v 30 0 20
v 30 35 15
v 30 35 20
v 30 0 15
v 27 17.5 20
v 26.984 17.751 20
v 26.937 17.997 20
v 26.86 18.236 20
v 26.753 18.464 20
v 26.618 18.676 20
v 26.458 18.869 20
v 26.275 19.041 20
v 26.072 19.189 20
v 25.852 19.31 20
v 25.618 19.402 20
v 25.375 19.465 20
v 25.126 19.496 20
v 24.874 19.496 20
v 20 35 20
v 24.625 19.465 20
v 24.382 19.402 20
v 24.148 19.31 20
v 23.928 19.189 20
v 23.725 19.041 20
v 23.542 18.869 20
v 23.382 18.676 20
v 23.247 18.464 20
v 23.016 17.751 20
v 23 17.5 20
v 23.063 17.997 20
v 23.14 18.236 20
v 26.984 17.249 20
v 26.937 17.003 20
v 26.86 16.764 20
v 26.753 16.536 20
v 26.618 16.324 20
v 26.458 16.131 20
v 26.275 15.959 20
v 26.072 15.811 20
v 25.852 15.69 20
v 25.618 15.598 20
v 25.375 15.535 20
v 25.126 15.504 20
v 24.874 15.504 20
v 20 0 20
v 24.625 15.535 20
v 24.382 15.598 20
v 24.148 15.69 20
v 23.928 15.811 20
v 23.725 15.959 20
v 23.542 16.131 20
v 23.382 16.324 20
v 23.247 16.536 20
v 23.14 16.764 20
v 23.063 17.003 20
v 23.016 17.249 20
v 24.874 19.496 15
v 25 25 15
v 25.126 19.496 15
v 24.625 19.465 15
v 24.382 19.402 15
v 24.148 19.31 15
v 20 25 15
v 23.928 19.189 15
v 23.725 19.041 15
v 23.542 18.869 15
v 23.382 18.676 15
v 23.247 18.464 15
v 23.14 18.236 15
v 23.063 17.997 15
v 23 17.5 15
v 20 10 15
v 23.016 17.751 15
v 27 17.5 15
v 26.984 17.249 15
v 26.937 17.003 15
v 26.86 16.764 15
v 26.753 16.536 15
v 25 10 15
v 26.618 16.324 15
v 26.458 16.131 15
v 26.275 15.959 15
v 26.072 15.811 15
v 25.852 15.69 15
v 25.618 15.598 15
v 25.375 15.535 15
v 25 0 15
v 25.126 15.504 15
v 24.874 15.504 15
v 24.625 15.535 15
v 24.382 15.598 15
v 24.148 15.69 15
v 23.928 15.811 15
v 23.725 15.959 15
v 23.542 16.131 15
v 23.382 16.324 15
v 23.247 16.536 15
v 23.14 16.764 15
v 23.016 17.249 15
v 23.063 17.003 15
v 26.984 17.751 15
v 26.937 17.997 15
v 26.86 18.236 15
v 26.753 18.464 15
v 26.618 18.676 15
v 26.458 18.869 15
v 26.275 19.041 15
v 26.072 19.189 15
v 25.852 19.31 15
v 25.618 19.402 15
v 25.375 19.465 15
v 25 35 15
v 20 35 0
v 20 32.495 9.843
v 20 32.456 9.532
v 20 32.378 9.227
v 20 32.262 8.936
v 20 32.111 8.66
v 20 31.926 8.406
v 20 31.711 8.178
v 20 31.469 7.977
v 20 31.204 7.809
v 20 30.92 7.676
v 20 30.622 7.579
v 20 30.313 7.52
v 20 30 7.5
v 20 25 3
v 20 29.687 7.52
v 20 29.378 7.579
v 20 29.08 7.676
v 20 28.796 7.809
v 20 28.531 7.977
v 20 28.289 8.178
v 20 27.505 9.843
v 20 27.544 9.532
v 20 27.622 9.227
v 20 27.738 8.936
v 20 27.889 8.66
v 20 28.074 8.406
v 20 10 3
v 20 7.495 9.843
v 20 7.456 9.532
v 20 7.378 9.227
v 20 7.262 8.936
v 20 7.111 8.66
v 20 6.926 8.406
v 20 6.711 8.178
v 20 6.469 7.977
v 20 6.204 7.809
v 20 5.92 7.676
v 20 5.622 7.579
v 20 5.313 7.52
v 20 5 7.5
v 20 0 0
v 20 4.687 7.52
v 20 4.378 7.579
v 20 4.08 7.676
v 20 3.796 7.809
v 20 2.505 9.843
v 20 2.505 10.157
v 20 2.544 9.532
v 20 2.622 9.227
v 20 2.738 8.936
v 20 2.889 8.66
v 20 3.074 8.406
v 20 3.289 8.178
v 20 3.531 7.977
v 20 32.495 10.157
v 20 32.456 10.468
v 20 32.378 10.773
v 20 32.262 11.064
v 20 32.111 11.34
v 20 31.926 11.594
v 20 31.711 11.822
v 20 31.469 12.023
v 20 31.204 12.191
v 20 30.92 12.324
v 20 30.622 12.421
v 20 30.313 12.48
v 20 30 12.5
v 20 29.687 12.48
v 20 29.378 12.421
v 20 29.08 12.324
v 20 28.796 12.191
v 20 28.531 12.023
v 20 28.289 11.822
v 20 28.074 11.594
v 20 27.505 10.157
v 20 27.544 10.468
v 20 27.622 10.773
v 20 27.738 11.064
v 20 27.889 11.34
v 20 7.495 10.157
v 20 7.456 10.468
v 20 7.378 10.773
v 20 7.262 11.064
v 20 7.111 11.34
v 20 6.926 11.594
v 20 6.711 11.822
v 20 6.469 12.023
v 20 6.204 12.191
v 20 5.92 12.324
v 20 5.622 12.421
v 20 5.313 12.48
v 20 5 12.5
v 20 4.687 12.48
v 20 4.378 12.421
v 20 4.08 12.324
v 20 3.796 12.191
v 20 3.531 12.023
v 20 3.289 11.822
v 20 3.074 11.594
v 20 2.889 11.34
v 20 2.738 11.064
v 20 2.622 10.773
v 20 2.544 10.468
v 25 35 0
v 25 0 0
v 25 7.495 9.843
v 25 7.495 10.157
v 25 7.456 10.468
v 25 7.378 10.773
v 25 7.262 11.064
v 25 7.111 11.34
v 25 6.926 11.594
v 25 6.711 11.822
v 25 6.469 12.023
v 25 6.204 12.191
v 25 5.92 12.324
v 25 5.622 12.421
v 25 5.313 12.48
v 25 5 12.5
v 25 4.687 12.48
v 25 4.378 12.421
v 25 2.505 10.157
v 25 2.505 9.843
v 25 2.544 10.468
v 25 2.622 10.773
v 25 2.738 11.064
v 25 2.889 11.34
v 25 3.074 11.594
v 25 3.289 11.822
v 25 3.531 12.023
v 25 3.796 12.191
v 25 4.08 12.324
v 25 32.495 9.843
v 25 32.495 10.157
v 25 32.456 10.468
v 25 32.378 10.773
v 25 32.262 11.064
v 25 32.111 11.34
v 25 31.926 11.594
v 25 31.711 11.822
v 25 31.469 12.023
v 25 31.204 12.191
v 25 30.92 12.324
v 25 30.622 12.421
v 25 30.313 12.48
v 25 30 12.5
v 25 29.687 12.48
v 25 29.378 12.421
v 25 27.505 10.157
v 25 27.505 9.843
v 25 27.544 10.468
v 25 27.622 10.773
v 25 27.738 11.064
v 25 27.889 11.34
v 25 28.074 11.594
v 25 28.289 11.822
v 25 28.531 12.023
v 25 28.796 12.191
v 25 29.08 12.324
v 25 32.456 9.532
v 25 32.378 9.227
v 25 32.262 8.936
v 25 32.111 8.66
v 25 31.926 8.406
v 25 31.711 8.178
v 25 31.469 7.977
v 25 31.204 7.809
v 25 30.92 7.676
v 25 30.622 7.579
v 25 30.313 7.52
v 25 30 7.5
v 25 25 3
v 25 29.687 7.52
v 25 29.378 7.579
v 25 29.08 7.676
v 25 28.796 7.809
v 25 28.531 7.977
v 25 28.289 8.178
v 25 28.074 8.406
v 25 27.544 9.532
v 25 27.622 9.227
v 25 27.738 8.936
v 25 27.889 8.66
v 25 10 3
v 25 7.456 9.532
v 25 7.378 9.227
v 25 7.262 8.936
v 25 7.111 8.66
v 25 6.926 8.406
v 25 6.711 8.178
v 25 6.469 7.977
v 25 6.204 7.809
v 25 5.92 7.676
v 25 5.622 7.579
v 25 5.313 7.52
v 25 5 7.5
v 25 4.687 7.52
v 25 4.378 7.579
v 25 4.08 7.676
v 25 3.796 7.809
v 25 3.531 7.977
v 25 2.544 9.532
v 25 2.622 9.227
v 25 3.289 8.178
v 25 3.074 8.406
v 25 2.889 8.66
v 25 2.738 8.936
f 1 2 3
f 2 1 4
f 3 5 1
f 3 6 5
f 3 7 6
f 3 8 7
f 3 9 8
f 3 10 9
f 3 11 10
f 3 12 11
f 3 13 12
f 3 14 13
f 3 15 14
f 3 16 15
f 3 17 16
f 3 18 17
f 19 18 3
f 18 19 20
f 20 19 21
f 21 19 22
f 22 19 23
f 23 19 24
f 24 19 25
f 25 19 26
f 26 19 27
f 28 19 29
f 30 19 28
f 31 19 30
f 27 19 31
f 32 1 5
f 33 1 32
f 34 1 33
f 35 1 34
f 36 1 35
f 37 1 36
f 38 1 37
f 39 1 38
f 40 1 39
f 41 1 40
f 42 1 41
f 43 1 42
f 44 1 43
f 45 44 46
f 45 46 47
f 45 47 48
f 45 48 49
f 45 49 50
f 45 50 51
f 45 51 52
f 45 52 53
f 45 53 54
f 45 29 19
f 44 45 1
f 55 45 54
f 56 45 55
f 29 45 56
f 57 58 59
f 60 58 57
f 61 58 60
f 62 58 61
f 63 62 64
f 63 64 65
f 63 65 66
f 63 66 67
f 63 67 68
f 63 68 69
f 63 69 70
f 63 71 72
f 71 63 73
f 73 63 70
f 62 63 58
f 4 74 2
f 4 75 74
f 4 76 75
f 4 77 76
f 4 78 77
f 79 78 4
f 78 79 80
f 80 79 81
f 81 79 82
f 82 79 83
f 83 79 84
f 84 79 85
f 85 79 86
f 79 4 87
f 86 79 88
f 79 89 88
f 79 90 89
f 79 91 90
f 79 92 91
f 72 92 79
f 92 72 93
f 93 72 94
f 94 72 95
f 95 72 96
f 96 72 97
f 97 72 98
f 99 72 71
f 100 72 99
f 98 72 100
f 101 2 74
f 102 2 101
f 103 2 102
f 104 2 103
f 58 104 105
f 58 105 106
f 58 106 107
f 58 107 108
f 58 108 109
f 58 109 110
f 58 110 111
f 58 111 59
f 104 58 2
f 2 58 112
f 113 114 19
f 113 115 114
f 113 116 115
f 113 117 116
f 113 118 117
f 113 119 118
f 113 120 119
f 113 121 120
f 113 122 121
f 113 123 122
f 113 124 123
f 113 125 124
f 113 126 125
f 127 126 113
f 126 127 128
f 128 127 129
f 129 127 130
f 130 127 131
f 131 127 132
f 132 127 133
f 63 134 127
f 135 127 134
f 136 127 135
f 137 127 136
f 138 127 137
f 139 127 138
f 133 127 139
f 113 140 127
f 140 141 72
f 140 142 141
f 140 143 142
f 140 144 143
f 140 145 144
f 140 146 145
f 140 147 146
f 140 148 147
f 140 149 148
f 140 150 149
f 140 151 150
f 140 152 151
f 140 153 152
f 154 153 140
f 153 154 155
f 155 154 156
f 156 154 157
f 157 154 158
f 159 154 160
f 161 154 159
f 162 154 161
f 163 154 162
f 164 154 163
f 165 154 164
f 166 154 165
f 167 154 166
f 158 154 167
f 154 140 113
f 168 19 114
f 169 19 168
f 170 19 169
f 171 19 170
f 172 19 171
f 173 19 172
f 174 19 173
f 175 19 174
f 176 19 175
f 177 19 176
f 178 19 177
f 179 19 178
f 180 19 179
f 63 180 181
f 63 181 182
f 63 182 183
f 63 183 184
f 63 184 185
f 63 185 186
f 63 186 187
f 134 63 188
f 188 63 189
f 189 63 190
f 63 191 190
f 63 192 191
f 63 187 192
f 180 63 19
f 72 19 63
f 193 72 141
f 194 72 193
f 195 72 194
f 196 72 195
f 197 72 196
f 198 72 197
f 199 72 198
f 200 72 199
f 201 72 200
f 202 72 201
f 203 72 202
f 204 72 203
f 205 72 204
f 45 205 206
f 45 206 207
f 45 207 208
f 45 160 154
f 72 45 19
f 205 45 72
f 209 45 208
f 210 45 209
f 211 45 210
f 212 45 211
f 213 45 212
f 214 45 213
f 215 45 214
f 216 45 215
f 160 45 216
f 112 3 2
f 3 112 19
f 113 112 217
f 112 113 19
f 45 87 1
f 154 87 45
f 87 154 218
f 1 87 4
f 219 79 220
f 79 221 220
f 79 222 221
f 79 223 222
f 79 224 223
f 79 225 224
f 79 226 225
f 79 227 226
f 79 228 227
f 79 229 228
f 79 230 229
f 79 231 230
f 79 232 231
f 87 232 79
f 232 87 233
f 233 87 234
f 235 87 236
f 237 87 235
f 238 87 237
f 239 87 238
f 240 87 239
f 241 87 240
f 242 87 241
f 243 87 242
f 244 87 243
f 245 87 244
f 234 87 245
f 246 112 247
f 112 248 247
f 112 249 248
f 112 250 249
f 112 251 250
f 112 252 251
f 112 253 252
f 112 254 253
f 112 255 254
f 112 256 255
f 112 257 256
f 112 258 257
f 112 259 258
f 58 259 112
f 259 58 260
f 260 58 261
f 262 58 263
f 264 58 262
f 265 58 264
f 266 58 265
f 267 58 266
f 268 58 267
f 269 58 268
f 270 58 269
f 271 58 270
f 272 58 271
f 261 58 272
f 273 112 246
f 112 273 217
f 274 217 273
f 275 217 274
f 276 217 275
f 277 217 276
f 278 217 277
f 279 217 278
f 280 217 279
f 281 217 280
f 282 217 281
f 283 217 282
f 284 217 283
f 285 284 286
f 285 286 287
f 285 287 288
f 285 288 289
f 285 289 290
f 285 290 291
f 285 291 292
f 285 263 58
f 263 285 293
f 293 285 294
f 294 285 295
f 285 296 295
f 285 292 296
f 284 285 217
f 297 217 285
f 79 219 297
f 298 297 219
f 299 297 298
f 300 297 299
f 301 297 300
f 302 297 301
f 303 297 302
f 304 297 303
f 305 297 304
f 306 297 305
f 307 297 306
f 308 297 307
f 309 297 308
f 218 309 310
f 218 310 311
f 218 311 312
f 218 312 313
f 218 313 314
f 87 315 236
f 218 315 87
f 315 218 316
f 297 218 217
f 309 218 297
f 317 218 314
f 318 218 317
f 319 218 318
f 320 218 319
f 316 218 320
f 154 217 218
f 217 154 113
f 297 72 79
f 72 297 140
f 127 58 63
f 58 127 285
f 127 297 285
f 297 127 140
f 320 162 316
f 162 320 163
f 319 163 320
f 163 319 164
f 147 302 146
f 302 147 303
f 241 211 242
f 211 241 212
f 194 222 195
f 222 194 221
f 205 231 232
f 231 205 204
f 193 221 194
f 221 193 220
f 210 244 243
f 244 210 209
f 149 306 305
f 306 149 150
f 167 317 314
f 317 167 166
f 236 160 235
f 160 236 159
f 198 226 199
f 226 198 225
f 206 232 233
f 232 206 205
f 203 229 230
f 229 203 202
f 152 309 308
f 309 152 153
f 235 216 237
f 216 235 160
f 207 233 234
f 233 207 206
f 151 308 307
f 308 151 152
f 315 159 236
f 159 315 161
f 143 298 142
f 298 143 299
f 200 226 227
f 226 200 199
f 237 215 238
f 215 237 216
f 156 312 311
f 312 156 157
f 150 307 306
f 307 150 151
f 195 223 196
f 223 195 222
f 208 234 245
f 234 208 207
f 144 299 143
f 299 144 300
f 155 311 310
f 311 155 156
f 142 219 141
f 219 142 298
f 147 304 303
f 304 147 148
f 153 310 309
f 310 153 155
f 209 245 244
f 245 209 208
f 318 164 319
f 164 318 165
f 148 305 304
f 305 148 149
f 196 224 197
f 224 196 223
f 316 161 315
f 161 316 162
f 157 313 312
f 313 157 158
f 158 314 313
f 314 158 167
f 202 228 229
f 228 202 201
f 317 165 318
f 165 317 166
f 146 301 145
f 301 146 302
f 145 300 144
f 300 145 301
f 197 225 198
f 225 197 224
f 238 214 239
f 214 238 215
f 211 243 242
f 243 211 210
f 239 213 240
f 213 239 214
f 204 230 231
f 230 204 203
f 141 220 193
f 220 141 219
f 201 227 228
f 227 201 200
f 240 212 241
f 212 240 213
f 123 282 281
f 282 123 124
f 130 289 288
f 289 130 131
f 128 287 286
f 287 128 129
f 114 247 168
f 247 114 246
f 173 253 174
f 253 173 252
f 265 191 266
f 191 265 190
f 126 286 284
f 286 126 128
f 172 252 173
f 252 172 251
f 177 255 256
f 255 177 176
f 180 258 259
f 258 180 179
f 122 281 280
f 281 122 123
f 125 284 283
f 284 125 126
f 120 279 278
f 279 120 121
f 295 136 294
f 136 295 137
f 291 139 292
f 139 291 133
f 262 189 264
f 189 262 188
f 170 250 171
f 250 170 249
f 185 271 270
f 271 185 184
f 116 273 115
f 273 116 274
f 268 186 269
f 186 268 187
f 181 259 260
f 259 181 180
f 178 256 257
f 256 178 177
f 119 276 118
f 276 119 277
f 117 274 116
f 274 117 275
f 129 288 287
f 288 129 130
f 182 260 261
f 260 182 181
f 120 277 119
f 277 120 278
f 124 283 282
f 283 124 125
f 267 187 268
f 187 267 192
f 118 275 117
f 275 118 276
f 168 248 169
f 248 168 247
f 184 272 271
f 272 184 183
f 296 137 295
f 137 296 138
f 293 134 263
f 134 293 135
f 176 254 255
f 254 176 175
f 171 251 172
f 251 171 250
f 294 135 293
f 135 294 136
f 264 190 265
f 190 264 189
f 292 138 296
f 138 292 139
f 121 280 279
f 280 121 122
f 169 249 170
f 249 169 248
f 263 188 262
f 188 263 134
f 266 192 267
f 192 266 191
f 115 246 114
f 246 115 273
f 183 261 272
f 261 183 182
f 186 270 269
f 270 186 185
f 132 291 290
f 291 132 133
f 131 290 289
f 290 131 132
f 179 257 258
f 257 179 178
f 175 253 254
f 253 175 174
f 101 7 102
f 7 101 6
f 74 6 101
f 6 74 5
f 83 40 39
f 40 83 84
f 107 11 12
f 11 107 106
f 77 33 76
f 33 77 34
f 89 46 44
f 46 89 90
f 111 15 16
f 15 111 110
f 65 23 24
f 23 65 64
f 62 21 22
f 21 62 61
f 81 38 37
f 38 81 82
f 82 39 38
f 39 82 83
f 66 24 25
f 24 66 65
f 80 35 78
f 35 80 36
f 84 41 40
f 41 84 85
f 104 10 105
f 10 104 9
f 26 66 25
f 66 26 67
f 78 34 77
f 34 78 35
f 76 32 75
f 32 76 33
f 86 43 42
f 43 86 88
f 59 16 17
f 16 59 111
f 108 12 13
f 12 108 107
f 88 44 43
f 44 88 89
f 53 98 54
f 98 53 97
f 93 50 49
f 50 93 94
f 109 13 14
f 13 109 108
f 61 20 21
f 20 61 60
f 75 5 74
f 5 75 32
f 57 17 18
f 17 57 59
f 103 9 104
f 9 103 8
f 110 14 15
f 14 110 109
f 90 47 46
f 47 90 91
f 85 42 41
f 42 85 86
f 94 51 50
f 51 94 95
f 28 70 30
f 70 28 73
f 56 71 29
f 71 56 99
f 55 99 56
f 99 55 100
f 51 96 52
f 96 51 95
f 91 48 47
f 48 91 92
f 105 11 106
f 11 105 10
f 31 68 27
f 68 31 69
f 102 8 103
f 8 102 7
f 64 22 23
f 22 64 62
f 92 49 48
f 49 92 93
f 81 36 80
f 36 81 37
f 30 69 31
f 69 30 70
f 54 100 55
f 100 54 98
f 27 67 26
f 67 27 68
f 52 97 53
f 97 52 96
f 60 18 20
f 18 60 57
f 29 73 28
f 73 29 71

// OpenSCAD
extrusion_size=20;
hole_size_for_extrusion=5;
hole_size_for_shock_absorber=4;
thickness=5;
length=35;

extra=10;
$fn=50;

hole=15;
connector=3;

//color("red") cube([20,200,20]);
difference(){
union(){translate([extrusion_size,0,extrusion_size-thickness])
cube([extra,length,thickness]);
    translate([extrusion_size,0,0])
cube([thickness,length/2-hole/2,extrusion_size]);
translate([extrusion_size,length/2+hole/2,0])
cube([thickness,length/2-hole/2,extrusion_size]);

translate([extrusion_size,0,0])
cube([thickness,length,connector]);}
    
#translate([extrusion_size/2,5,10]) rotate(90,[0,1,0]) cylinder(r=hole_size_for_extrusion/2,h=20);
    
   
#translate([extrusion_size/2,length-5,10])  rotate(90,[0,1,0]) cylinder(r=hole_size_for_extrusion/2,h=20);    
    
  #  translate([extrusion_size+extra/2,length/2,10]) cylinder(r=1*+hole_size_for_shock_absorber/2,h=20);    
}
